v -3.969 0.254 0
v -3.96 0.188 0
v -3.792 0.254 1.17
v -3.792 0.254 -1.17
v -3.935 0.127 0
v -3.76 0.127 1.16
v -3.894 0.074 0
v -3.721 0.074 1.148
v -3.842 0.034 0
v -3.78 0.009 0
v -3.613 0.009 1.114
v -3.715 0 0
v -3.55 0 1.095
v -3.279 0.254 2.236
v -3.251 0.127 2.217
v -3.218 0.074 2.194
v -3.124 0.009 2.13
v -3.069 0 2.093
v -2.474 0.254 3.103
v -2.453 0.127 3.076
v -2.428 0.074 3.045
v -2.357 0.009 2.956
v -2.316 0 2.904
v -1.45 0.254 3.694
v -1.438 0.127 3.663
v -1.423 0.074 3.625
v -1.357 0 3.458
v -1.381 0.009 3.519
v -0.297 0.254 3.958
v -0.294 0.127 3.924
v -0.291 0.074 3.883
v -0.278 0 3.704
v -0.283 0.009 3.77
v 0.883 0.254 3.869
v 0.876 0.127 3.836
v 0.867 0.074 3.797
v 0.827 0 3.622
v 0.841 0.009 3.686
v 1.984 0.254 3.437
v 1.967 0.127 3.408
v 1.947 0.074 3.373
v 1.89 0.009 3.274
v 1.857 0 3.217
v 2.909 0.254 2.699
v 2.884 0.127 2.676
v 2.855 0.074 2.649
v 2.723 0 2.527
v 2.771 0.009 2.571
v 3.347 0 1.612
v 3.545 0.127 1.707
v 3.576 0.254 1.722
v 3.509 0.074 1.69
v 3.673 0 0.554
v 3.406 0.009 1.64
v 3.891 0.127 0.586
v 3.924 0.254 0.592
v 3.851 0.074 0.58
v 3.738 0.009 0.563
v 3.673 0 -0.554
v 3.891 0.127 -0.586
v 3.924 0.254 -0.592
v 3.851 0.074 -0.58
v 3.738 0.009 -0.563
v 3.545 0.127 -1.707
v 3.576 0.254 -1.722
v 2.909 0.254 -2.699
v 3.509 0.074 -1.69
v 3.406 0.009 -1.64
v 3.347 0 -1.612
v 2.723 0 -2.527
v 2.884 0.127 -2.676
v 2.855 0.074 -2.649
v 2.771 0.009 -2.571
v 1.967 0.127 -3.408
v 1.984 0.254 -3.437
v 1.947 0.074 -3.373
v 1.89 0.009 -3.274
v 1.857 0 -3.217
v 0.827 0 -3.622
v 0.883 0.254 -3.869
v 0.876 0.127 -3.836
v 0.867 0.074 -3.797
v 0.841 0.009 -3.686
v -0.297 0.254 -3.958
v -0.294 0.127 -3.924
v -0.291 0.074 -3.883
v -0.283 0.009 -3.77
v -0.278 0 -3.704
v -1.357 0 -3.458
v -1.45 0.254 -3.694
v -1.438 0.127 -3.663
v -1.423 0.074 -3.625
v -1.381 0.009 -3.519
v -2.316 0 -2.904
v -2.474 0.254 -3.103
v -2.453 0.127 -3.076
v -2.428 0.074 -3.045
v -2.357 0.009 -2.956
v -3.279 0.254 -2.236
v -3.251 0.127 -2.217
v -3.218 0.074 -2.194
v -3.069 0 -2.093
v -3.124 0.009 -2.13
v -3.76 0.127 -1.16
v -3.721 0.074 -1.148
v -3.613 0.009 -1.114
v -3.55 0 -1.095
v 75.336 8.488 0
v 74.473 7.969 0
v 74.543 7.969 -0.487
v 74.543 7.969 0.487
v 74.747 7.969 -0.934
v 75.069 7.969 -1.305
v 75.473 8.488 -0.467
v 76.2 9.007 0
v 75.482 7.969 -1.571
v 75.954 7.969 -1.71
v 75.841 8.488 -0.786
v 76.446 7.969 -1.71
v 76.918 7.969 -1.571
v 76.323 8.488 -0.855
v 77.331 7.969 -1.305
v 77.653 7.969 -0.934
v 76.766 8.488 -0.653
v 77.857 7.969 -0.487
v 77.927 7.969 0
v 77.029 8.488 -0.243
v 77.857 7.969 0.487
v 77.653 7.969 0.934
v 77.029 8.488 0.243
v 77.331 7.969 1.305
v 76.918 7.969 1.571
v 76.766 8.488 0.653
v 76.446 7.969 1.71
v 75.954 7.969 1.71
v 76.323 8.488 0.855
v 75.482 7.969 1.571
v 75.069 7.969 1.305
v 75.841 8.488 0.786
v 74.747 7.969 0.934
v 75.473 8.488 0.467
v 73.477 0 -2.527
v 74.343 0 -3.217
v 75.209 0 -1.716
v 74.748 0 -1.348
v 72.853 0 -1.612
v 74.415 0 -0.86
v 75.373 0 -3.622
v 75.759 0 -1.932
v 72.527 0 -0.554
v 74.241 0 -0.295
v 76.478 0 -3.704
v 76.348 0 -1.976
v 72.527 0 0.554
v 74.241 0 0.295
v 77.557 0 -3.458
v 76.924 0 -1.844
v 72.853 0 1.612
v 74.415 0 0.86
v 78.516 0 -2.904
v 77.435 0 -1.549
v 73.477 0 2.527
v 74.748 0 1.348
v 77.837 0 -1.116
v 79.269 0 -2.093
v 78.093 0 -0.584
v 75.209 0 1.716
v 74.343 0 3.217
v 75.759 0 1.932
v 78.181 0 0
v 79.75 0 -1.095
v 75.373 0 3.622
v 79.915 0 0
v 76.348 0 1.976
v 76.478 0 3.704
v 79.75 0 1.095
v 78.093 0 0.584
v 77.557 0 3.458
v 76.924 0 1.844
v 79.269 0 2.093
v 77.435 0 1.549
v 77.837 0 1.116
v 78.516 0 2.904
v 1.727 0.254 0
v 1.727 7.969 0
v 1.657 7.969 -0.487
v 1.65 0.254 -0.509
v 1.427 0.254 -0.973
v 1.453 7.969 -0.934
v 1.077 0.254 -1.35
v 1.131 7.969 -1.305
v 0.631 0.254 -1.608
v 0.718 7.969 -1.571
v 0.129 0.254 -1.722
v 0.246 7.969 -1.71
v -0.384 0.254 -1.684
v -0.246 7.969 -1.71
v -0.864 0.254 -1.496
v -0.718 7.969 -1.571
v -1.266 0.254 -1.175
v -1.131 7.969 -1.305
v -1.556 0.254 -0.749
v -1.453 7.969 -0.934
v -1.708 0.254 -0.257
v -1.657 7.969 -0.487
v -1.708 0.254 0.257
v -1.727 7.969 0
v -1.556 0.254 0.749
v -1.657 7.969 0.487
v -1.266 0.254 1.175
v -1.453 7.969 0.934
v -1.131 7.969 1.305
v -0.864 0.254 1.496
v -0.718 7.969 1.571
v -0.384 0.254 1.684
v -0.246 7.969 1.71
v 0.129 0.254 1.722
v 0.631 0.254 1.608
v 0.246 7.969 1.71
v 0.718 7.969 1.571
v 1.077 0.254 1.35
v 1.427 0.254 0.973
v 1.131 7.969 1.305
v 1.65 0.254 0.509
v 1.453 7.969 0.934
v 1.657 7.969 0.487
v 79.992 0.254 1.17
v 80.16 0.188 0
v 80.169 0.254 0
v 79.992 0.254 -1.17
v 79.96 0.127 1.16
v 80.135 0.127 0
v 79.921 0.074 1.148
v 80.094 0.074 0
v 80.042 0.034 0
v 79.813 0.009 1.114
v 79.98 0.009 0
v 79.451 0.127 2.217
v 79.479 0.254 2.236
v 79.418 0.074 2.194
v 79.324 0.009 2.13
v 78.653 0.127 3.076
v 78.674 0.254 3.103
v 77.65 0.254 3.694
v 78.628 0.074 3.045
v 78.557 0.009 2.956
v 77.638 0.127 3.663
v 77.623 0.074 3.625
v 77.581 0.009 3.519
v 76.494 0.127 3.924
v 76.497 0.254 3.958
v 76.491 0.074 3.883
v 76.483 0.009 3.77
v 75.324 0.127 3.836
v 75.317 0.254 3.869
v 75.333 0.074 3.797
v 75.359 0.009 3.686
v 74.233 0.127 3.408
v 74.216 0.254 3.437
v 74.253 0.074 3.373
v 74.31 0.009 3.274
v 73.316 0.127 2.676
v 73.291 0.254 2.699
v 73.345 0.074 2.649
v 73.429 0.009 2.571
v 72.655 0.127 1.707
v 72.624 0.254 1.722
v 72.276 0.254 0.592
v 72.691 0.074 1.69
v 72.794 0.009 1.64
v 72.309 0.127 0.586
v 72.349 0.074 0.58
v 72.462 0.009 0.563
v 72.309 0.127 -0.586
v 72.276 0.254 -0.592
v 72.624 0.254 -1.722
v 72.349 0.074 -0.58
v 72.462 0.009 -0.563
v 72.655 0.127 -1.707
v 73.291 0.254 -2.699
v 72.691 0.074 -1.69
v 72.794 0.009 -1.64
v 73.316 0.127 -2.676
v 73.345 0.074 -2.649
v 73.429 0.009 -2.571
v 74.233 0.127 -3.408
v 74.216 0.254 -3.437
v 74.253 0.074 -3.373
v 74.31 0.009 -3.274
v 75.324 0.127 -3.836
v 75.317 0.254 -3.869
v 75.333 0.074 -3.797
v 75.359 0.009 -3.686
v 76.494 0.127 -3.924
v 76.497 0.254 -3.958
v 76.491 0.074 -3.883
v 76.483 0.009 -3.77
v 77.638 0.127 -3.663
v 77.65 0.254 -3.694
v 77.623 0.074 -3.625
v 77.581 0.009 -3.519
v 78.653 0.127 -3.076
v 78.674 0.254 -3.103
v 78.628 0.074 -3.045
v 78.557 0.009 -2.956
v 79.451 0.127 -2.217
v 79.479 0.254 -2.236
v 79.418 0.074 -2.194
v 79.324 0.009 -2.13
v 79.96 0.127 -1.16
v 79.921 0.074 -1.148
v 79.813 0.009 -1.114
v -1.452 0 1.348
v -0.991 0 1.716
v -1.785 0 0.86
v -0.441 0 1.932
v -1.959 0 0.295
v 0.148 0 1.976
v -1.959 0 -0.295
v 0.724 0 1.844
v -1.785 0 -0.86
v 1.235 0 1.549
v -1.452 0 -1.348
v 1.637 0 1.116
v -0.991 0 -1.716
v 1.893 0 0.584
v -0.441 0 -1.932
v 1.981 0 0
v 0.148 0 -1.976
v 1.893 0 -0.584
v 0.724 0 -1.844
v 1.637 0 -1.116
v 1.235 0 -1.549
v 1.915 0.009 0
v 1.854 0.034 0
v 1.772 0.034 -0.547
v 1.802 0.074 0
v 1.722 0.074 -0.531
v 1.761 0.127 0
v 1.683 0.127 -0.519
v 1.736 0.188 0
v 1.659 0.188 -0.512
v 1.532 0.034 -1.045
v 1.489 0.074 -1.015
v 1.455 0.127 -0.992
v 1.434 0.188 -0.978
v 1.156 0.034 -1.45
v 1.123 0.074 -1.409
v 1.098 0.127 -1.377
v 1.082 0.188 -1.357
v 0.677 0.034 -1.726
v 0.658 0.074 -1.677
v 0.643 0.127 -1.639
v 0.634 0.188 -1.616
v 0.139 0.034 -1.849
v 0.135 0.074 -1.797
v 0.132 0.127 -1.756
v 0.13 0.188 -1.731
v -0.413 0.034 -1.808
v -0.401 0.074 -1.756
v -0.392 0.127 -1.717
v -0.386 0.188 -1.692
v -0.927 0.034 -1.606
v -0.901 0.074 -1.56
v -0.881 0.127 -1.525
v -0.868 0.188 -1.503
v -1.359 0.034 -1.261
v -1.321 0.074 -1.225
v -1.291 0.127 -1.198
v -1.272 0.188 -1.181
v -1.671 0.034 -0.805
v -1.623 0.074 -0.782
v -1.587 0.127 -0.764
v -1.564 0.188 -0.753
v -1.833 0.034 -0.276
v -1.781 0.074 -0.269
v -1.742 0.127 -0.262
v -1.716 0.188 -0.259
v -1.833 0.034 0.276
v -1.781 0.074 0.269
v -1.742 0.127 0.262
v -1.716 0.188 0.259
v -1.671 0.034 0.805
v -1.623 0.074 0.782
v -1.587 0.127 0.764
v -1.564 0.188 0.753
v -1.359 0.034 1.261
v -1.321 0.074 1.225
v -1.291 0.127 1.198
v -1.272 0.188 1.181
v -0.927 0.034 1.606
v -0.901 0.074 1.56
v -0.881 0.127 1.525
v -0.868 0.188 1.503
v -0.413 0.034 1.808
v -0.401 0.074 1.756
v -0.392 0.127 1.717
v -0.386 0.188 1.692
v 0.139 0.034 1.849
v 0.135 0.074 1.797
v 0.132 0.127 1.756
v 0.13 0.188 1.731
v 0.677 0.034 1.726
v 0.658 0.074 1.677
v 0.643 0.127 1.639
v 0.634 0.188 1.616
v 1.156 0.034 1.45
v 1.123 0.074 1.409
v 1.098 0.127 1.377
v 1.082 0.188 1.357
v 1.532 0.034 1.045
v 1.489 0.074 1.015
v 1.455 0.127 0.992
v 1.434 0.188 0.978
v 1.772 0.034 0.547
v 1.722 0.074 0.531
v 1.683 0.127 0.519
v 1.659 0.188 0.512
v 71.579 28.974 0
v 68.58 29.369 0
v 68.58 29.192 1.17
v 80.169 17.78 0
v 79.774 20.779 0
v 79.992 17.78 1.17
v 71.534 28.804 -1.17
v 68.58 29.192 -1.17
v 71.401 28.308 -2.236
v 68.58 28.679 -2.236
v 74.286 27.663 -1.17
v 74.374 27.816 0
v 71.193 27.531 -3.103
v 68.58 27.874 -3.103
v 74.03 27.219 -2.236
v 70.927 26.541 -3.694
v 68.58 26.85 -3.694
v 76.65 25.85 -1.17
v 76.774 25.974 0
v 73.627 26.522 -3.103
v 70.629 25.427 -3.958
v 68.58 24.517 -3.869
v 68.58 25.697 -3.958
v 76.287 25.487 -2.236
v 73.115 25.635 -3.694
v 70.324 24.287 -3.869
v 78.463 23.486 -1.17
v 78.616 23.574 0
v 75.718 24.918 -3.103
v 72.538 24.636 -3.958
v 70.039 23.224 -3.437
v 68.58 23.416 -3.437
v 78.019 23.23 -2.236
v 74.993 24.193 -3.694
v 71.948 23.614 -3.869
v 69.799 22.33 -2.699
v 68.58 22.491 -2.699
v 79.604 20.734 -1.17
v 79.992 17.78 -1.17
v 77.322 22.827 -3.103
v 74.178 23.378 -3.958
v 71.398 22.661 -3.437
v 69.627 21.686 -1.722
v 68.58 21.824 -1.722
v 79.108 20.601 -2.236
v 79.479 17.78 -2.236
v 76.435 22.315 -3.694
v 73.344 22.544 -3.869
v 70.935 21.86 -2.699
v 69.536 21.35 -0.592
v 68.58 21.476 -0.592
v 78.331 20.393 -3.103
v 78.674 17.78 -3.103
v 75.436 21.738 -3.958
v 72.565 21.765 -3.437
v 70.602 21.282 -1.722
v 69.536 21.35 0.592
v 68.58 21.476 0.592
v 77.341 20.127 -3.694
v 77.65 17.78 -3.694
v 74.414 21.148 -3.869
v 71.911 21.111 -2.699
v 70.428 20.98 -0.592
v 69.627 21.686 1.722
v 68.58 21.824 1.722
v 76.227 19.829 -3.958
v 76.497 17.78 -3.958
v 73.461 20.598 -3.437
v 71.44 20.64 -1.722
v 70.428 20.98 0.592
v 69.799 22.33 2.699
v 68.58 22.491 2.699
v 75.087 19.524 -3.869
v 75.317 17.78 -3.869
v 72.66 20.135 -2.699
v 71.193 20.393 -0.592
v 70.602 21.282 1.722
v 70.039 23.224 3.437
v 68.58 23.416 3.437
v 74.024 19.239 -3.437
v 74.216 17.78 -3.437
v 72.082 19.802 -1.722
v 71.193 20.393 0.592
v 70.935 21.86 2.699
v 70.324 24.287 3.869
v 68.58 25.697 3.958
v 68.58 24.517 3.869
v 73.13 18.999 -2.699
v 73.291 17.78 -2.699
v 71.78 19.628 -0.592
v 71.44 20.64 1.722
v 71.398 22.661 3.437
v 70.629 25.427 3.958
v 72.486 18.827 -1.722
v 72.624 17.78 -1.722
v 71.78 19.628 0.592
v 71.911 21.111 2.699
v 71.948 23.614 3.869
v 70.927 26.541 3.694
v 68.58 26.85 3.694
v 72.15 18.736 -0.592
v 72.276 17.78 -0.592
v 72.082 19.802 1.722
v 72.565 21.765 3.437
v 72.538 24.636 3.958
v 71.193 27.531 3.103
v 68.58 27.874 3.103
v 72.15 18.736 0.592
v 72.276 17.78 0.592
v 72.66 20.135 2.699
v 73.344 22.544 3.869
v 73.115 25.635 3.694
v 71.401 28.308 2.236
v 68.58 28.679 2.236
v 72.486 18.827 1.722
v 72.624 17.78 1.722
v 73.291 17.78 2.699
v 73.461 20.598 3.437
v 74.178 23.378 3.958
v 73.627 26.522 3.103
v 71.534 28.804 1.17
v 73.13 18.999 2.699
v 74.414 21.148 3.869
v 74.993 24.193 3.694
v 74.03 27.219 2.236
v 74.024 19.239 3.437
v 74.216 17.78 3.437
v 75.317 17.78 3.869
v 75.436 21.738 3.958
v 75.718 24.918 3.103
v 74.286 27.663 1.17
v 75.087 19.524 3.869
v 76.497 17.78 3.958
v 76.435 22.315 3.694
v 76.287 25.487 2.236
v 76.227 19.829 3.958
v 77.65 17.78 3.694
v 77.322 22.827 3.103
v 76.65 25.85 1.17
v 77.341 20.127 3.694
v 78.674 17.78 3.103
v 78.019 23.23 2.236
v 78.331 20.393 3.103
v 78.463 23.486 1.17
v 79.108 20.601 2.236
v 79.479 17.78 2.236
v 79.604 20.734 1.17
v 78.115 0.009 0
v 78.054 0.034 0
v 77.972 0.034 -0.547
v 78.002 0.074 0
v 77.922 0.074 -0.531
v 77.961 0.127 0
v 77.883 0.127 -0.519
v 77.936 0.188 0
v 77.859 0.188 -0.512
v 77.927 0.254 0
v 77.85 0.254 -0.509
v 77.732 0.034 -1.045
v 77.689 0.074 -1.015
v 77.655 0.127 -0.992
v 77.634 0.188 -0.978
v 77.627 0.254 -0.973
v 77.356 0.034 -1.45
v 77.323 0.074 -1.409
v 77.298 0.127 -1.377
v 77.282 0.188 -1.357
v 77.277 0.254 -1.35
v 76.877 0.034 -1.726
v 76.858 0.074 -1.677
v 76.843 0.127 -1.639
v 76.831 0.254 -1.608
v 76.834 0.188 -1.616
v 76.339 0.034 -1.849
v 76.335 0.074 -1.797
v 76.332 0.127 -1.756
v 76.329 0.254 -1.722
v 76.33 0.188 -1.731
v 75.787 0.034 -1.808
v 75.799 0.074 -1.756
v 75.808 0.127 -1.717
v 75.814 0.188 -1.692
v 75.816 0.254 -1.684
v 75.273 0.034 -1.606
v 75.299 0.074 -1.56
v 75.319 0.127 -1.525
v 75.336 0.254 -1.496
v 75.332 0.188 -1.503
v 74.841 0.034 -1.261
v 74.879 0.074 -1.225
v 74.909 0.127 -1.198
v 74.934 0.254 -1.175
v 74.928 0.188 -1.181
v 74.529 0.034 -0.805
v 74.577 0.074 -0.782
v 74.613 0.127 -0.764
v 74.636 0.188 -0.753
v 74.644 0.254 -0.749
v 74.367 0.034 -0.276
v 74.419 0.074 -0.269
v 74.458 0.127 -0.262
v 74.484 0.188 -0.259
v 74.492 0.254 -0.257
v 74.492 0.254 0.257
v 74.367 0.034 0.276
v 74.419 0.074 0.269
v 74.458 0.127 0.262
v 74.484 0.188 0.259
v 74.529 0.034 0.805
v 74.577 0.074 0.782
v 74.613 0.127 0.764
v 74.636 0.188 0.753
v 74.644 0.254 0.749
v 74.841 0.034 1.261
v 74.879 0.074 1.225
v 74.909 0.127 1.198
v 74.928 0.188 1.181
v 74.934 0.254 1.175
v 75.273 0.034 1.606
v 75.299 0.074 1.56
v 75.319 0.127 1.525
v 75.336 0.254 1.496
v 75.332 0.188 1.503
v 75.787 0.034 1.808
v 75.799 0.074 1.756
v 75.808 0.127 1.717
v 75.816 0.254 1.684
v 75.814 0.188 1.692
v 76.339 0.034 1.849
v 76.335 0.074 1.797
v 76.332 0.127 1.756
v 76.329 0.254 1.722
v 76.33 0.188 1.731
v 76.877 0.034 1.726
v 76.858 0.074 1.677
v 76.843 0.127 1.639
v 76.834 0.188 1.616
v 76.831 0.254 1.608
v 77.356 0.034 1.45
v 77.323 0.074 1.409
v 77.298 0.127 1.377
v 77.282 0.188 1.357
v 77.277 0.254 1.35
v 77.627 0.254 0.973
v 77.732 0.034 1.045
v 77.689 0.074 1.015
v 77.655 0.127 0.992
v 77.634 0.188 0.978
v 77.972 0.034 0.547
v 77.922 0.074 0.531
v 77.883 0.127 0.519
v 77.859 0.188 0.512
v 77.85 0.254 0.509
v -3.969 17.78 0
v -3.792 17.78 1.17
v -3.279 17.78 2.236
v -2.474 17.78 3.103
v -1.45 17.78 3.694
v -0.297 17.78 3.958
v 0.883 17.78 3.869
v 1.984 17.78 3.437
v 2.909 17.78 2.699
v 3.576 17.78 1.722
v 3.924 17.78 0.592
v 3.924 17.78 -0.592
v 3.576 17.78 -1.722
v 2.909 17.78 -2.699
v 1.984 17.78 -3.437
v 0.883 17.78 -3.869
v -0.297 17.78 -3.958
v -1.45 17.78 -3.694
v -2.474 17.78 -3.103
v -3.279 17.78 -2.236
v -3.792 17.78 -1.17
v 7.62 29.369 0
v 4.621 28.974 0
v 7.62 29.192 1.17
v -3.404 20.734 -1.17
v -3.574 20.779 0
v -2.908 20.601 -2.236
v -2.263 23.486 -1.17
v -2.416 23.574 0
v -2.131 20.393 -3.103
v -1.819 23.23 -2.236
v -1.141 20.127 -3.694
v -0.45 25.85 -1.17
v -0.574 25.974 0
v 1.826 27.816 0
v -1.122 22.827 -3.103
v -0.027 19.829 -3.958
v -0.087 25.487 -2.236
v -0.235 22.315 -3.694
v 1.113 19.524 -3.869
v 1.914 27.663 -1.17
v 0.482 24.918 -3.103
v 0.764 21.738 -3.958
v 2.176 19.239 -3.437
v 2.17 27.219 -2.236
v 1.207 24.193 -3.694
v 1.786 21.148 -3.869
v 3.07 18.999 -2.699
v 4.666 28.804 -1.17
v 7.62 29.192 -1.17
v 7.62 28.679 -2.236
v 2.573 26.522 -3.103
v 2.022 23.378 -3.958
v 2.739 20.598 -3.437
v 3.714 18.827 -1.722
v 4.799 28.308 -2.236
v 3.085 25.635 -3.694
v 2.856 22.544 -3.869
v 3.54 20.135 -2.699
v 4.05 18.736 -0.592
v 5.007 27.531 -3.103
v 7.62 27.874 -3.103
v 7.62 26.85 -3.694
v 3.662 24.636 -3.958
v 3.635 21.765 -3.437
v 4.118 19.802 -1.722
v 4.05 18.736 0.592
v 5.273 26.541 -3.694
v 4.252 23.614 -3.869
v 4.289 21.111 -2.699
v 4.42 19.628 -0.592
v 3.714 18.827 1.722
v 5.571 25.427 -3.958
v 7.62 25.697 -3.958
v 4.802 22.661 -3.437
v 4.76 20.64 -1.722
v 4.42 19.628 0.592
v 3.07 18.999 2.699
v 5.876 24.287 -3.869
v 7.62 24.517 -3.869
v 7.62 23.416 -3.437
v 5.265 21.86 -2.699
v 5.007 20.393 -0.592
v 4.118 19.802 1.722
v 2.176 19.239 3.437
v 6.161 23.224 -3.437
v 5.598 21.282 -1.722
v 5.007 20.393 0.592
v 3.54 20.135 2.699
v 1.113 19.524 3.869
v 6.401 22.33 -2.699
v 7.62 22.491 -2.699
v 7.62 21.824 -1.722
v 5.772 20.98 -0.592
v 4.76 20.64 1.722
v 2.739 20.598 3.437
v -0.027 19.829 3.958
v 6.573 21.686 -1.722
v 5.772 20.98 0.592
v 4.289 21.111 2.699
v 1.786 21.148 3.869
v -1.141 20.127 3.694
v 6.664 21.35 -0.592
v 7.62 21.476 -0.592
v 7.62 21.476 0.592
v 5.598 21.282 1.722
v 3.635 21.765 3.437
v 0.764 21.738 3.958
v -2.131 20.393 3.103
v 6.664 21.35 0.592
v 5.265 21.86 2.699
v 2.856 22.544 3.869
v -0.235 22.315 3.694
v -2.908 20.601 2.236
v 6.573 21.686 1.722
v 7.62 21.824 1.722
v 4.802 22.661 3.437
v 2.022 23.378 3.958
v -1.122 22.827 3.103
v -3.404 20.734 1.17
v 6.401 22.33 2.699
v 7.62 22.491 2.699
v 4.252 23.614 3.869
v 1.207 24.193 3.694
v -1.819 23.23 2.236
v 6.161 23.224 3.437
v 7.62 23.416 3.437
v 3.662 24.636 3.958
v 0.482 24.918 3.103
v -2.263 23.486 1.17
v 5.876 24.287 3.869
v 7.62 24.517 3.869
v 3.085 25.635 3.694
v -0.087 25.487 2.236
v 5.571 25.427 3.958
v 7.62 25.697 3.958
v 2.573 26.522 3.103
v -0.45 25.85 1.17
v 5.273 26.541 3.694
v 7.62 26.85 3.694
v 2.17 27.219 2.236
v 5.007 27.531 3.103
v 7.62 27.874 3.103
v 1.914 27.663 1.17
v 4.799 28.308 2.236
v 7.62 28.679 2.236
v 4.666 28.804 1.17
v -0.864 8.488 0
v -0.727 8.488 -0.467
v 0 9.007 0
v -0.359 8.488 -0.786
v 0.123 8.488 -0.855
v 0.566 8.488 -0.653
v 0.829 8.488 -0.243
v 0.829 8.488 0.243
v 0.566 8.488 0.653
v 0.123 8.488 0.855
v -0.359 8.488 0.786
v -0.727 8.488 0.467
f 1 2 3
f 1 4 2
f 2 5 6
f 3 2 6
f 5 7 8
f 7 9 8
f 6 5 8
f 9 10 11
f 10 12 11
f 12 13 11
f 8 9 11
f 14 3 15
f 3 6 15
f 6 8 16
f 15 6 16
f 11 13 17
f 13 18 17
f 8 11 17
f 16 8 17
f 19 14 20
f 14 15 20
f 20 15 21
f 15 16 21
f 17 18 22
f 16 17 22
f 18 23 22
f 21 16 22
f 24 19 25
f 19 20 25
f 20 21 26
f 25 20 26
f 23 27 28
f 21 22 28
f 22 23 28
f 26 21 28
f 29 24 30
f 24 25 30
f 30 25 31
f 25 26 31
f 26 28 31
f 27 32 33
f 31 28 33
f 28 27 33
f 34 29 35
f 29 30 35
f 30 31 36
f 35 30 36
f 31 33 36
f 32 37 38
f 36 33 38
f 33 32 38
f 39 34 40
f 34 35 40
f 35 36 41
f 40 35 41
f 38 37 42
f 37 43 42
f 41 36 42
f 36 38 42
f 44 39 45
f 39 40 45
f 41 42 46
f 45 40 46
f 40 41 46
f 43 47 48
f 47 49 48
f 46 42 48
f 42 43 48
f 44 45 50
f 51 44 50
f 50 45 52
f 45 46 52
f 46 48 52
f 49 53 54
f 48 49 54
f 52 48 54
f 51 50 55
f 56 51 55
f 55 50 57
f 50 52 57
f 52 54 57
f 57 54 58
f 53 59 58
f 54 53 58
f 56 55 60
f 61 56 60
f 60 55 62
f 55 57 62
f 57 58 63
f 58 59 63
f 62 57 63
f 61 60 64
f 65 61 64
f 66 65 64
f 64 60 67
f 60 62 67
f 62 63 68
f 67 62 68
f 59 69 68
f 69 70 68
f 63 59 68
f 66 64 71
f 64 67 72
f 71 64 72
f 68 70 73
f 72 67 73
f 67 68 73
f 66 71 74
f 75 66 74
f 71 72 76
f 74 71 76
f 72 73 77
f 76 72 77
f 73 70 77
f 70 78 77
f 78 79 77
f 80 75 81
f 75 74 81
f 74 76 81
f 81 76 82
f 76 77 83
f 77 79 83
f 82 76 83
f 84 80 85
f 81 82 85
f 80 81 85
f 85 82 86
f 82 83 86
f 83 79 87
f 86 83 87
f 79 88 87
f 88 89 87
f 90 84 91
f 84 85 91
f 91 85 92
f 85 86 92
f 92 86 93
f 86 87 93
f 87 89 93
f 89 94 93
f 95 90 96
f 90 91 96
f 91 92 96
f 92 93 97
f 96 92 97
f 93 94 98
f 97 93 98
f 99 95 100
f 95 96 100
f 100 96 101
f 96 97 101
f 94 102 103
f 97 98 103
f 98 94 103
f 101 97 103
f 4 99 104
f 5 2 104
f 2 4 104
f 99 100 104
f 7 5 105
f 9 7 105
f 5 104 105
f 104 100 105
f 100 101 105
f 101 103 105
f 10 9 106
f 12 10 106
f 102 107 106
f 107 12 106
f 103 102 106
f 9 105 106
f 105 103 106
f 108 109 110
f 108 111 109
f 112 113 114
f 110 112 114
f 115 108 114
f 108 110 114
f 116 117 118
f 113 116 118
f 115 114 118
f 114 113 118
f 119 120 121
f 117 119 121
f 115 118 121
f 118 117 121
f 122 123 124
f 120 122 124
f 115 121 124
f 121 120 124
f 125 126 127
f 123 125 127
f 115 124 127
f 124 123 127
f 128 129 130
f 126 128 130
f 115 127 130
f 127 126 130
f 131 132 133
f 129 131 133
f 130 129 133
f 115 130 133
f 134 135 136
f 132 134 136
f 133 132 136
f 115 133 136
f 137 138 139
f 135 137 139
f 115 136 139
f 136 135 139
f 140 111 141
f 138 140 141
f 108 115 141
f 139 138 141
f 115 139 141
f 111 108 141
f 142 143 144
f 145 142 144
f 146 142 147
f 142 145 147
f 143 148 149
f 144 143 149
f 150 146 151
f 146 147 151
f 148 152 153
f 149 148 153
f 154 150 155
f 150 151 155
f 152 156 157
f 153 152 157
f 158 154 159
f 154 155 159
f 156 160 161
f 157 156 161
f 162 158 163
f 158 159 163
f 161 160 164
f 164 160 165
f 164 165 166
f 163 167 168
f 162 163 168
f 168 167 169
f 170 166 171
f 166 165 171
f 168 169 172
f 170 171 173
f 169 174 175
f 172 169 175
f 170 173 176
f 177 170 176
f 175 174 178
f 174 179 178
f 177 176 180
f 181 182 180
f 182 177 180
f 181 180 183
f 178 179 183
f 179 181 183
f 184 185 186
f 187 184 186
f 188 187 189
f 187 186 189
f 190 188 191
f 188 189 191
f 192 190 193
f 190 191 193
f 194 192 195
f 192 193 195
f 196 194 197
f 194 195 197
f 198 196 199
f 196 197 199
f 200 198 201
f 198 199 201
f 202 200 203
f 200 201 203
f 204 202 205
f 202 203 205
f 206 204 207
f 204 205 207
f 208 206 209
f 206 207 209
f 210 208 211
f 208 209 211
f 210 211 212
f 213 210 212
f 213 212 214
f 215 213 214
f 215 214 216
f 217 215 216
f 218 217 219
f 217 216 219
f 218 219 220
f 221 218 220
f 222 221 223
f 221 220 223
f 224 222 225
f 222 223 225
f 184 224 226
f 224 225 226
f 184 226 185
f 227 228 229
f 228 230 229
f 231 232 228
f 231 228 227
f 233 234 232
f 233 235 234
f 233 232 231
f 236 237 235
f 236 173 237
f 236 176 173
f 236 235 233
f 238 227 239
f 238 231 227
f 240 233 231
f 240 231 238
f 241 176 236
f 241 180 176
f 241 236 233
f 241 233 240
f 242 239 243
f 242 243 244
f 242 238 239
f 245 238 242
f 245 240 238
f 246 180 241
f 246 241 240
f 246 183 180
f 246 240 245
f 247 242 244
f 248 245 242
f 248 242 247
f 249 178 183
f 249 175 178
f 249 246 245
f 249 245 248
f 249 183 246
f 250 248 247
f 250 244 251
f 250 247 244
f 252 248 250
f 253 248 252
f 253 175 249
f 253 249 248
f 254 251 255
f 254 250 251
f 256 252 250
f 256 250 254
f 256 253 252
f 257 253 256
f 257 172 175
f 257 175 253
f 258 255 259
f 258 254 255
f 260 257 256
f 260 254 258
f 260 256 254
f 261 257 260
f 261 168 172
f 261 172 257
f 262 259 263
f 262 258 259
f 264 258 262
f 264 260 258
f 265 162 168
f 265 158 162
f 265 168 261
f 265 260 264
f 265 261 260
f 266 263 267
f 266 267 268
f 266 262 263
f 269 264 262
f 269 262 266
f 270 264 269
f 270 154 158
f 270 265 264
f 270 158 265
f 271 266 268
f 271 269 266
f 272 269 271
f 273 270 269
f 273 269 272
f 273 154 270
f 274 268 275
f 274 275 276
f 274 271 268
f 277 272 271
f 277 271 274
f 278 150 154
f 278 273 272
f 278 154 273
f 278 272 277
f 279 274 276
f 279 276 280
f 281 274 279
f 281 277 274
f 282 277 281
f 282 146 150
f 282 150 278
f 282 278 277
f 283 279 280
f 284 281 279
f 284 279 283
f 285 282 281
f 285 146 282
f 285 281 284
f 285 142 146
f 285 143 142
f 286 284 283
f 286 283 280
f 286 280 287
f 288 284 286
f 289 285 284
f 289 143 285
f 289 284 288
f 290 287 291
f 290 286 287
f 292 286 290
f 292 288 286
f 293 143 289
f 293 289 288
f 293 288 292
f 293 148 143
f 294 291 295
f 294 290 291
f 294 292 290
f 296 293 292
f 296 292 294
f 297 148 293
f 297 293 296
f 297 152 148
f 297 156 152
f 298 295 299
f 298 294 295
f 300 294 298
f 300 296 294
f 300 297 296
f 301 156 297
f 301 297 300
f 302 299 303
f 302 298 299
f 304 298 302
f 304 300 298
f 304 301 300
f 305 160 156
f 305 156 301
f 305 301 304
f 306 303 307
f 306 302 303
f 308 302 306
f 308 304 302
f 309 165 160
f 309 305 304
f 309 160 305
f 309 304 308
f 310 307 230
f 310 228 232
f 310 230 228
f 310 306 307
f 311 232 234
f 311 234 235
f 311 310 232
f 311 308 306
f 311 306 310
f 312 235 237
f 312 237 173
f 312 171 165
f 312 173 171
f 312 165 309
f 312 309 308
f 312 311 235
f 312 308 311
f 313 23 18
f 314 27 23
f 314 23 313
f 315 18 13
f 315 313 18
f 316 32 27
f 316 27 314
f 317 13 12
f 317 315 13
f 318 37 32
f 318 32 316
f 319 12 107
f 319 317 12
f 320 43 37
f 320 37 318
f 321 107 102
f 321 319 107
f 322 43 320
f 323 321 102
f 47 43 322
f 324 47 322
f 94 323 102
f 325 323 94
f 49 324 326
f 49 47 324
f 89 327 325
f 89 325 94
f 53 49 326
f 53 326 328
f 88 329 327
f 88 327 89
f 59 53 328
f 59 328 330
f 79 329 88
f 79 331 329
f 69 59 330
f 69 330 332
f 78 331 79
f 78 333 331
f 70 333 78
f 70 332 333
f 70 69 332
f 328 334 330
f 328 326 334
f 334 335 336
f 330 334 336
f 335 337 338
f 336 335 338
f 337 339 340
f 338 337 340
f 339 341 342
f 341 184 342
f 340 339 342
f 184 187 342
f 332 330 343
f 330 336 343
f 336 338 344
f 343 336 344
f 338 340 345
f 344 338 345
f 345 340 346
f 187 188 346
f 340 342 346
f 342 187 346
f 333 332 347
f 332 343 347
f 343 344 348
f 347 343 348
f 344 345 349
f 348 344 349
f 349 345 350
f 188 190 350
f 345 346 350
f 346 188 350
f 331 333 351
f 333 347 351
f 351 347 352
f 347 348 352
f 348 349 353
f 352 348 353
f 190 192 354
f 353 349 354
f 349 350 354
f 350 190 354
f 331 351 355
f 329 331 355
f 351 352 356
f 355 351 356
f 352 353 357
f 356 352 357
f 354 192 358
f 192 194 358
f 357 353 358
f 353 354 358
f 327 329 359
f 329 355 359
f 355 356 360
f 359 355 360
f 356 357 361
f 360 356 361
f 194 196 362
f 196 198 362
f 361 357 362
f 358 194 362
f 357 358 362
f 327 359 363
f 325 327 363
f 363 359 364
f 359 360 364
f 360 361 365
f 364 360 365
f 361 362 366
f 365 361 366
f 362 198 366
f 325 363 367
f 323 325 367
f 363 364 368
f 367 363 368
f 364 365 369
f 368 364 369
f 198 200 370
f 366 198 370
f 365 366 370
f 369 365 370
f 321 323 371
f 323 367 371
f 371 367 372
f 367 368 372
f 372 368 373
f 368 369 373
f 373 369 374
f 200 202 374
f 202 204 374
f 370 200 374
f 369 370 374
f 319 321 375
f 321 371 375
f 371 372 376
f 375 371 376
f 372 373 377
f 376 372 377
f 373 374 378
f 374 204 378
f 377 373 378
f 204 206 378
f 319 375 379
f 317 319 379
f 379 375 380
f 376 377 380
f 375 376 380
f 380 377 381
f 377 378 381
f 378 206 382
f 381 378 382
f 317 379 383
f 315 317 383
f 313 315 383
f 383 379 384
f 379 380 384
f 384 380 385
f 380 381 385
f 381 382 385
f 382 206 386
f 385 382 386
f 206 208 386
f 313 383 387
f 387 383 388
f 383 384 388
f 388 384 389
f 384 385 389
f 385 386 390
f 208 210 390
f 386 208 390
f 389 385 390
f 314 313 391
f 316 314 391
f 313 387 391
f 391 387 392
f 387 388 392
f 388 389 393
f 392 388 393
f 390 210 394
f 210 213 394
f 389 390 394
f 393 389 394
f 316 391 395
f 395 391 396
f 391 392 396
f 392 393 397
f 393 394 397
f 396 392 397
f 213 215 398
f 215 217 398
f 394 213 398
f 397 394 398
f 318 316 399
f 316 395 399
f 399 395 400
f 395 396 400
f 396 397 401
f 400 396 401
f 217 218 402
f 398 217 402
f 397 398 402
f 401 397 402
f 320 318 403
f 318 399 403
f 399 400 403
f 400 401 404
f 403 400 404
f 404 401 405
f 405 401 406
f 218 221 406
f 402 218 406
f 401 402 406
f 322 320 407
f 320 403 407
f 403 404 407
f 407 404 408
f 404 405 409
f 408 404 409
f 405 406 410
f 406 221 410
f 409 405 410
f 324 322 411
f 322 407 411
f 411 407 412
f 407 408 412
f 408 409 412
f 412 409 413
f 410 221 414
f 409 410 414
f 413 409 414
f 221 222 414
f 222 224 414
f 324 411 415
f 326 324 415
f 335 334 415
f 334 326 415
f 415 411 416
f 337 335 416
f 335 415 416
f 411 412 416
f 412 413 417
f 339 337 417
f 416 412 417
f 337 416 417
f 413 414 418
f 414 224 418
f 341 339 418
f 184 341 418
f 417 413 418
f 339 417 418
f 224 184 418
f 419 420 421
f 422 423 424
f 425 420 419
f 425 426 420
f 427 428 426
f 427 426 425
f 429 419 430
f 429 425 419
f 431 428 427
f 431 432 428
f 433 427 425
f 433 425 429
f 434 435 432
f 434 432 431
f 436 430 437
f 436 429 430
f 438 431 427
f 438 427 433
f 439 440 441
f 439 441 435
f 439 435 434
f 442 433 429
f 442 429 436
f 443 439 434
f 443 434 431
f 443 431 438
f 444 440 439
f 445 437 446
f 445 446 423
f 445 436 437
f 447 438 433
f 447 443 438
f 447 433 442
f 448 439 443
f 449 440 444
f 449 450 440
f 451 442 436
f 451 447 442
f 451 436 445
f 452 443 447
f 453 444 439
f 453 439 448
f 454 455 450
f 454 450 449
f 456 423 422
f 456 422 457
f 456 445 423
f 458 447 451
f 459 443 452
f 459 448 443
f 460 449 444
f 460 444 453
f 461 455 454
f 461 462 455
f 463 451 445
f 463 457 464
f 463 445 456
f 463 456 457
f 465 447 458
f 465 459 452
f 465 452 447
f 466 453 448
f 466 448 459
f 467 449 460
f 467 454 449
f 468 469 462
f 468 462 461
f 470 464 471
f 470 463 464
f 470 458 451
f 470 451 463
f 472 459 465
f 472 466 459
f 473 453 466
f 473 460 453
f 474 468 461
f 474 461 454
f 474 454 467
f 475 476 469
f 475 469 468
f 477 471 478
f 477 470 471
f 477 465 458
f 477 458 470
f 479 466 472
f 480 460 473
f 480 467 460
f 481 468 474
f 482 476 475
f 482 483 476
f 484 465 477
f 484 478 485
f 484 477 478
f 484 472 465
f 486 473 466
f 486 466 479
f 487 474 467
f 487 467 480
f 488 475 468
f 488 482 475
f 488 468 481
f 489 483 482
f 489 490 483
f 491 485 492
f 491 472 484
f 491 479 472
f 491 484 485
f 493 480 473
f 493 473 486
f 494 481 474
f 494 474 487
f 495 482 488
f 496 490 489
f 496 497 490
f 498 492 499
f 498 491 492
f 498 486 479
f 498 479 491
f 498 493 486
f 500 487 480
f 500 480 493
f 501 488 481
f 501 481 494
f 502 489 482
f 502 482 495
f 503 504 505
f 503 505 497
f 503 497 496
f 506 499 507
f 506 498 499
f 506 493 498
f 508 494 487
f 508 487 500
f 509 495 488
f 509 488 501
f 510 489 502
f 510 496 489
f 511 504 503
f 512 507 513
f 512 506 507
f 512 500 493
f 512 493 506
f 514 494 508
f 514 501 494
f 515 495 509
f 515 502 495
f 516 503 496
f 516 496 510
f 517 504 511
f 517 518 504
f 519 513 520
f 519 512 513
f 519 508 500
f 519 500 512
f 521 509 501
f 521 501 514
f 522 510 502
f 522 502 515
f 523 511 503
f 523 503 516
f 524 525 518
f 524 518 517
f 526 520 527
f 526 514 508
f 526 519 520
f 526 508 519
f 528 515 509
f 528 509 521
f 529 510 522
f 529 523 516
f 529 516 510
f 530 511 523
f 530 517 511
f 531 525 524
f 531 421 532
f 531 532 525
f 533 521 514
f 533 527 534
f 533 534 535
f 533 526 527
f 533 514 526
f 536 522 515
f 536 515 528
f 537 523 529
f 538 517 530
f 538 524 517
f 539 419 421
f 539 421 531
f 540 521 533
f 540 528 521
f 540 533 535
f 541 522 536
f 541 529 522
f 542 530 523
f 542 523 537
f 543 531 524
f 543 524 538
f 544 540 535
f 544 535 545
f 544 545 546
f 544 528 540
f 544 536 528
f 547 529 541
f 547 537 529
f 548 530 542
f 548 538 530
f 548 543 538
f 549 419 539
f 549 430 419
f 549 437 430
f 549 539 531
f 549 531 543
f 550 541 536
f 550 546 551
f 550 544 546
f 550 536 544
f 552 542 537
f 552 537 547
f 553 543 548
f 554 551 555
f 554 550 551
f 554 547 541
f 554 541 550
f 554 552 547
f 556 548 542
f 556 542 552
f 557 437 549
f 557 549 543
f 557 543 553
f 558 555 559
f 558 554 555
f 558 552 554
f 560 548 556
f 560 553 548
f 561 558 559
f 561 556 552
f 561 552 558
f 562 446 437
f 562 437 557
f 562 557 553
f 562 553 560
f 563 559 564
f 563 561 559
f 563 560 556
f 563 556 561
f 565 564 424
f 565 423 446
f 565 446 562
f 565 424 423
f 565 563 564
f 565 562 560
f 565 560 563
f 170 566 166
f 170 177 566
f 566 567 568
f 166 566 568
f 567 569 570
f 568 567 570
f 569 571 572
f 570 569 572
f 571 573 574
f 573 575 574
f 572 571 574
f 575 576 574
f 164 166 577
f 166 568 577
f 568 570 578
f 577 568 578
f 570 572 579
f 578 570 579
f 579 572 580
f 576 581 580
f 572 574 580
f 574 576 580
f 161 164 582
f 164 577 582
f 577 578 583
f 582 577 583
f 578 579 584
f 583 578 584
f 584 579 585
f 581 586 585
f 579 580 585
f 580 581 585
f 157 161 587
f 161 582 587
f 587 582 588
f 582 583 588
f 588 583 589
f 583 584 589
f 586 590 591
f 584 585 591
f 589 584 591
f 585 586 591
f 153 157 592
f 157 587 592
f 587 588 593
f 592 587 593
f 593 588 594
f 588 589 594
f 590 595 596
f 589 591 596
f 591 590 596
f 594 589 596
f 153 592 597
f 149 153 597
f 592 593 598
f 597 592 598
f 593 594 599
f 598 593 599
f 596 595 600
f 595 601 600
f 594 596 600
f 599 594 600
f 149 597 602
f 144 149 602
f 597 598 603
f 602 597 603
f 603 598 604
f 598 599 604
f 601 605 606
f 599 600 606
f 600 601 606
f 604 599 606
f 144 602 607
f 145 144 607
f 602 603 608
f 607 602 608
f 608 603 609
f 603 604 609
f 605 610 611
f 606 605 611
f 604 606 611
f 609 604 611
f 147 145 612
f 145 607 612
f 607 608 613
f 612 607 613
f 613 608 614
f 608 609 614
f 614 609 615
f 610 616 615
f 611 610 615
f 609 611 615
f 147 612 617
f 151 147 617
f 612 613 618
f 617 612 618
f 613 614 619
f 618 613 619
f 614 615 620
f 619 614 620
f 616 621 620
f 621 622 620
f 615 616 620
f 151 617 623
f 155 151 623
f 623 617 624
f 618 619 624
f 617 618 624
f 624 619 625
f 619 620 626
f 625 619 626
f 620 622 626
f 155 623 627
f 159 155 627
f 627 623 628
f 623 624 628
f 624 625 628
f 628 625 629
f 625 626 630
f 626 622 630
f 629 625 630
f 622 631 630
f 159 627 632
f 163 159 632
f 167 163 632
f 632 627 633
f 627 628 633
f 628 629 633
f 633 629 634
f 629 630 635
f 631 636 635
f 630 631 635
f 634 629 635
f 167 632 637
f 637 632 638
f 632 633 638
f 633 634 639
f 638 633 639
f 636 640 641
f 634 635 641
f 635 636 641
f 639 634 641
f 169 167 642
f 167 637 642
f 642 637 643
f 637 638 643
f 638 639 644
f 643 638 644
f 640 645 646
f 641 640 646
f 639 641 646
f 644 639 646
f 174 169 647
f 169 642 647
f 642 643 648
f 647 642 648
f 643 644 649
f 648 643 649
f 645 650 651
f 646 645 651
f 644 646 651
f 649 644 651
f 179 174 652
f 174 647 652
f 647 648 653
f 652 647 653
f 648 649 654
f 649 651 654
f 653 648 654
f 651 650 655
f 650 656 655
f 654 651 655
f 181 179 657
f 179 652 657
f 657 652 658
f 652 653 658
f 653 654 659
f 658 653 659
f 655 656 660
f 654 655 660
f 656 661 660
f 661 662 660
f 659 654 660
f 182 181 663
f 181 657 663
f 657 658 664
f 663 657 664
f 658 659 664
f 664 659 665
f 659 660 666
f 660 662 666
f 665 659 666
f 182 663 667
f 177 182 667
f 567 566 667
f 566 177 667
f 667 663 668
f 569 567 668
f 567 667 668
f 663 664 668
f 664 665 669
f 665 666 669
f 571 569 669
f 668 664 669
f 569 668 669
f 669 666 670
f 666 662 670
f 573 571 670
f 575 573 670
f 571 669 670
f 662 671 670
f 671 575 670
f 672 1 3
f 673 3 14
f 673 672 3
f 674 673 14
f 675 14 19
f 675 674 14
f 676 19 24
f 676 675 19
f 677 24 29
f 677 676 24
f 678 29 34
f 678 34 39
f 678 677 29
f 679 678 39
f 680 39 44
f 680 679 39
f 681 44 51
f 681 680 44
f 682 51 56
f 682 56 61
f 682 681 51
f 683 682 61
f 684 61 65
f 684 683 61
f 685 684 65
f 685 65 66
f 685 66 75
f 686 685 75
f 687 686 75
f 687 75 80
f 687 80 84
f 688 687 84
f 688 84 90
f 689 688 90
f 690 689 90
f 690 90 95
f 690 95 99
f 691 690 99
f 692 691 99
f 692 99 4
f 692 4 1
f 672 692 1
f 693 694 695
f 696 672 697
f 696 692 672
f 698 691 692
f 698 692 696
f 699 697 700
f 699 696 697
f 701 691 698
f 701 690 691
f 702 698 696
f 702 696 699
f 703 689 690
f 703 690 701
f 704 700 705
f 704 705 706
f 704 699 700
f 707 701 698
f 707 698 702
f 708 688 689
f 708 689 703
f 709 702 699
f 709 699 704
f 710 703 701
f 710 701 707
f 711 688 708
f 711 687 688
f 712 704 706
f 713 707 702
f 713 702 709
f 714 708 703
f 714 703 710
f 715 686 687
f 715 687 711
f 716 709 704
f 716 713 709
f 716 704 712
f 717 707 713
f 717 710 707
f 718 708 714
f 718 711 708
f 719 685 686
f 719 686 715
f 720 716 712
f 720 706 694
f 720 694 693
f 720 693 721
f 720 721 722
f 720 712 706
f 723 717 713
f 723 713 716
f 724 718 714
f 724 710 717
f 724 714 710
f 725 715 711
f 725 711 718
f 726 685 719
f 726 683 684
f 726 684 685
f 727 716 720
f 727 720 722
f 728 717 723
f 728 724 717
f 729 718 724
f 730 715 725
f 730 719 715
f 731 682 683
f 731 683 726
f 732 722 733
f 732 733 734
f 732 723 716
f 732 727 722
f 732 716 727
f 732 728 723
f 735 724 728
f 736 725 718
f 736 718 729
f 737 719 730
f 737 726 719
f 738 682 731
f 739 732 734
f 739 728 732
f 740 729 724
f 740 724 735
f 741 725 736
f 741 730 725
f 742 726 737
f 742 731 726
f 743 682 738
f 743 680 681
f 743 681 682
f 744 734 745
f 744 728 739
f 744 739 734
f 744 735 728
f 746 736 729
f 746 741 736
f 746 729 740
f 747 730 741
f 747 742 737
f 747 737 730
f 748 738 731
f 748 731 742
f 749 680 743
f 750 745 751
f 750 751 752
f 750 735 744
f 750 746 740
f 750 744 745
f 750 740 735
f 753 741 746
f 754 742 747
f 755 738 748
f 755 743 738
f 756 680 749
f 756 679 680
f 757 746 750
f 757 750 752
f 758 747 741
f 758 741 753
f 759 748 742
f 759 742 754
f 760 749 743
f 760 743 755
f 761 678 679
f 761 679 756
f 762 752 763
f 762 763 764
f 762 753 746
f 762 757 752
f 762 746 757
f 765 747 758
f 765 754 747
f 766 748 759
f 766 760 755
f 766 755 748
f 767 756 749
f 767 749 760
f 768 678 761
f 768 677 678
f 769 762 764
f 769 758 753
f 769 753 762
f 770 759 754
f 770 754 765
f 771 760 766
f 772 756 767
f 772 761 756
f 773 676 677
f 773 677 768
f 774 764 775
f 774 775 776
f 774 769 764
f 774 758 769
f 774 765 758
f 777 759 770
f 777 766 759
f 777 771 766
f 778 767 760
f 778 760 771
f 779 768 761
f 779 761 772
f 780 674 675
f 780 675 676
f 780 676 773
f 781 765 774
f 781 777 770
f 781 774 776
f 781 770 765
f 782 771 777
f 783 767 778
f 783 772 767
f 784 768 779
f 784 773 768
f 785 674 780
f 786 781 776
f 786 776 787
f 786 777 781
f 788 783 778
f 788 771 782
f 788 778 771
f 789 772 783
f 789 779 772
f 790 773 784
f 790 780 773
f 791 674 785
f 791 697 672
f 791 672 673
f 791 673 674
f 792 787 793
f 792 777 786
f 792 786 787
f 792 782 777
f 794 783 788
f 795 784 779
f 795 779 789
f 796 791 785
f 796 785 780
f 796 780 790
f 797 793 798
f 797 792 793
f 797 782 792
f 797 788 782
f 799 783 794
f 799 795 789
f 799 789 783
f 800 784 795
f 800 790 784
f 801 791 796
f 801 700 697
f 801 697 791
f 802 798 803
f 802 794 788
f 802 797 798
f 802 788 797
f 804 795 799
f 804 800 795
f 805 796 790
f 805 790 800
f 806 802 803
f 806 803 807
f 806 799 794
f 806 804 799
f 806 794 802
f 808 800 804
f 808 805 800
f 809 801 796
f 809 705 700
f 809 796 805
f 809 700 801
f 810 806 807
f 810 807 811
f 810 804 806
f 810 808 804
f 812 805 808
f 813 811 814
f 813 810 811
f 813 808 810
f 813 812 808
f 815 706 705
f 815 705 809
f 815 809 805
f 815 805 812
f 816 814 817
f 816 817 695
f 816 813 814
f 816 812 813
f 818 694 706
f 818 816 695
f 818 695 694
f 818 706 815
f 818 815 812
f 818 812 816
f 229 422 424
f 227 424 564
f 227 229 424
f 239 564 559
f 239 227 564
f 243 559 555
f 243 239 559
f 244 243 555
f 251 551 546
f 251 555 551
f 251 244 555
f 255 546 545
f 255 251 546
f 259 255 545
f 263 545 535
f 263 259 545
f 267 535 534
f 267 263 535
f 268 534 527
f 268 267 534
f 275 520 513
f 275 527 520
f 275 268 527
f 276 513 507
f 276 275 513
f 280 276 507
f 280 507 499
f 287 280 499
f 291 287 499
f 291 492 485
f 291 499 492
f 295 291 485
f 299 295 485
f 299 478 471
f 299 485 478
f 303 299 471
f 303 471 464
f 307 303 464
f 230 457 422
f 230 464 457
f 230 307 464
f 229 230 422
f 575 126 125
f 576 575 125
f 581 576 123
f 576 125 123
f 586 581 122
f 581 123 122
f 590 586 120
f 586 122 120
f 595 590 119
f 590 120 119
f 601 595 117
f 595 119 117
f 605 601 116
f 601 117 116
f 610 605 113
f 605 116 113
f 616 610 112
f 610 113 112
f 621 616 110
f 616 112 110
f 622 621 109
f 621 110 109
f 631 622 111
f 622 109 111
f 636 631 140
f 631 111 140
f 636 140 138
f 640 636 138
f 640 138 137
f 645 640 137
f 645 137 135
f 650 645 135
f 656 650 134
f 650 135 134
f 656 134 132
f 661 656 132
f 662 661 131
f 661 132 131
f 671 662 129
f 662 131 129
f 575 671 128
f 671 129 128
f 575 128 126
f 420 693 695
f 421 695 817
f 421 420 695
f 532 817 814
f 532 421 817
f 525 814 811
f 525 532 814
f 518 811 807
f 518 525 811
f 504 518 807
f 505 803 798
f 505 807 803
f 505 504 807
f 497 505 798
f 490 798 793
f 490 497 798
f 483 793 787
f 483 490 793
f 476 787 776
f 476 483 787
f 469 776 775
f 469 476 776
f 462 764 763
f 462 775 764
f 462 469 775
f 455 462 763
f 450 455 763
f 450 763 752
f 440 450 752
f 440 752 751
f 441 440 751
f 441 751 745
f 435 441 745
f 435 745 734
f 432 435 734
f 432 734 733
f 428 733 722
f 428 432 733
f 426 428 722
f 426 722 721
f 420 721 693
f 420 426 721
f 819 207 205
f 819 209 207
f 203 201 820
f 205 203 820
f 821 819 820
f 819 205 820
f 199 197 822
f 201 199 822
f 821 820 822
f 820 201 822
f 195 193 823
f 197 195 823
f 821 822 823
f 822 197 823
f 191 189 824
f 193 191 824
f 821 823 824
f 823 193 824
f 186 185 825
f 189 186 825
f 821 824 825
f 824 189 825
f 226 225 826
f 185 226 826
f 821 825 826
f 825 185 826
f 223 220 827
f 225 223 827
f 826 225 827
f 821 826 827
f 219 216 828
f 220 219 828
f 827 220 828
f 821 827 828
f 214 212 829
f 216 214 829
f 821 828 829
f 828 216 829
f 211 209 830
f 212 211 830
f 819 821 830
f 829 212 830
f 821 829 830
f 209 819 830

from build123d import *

# Parameters (mm, degrees)
SKETCH2_R                     = 3.96875
TAP_DRILL_FOR_8_32_TAP1_D     = 3.4544
TAP_DRILL_FOR_8_32_TAP1_DEPTH = 7.96925
TAP_DRILL_FOR_8_32_TAP1_TIP   = 1.037806461
FILLET1_R                     = 0.254


with BuildPart() as part:
    # Sweep5: sweep along a path in Sketch1
    with BuildLine(Plane.XY) as sweep5_path:
        Line((0, 0), (0, 17.78))
        ThreePointArc((0, 17.78), (2.231846327, 23.168153673), (7.62, 25.4))
        Line((7.62, 25.4), (68.58, 25.4))
        ThreePointArc((68.58, 25.4), (73.968153673, 23.168153673), (76.2, 17.78))
        Line((76.2, 17.78), (76.2, 0))
    # Sketch2 → Sweep5 (sweep)
    with BuildSketch(Plane(origin=(0, 0, 0), x_dir=(1, 0, 0), z_dir=(0, 1, 0))):
        with Locations((76.2, 0)):
            Circle(SKETCH2_R)
    sweep(path=sweep5_path.line)

    # Tap Drill for #8-32 Tap1
    with Locations(Plane(origin=(0, 0, 0), x_dir=(-1, 0, 0), z_dir=(0, -1, 0))):
        with Locations((-76.2, 0), (0, 0)):
            Hole(TAP_DRILL_FOR_8_32_TAP1_D / 2, depth=TAP_DRILL_FOR_8_32_TAP1_DEPTH)
            with Locations((0, 0, -(TAP_DRILL_FOR_8_32_TAP1_DEPTH + TAP_DRILL_FOR_8_32_TAP1_TIP / 2))):  # 118° drill point
                Cone(0, TAP_DRILL_FOR_8_32_TAP1_D / 2, TAP_DRILL_FOR_8_32_TAP1_TIP, mode=Mode.SUBTRACT)

    # Fillet1
    fillet1_edges = [part.edges().sort_by_distance(p)[0] for p in [
        (-1.7272, 0, 0),
        (74.4728, 0, 0),
        (72.23125, 0, 0),
        (3.96875, 0, 0),
    ]]
    fillet(fillet1_edges, radius=FILLET1_R)


solid = part.part
